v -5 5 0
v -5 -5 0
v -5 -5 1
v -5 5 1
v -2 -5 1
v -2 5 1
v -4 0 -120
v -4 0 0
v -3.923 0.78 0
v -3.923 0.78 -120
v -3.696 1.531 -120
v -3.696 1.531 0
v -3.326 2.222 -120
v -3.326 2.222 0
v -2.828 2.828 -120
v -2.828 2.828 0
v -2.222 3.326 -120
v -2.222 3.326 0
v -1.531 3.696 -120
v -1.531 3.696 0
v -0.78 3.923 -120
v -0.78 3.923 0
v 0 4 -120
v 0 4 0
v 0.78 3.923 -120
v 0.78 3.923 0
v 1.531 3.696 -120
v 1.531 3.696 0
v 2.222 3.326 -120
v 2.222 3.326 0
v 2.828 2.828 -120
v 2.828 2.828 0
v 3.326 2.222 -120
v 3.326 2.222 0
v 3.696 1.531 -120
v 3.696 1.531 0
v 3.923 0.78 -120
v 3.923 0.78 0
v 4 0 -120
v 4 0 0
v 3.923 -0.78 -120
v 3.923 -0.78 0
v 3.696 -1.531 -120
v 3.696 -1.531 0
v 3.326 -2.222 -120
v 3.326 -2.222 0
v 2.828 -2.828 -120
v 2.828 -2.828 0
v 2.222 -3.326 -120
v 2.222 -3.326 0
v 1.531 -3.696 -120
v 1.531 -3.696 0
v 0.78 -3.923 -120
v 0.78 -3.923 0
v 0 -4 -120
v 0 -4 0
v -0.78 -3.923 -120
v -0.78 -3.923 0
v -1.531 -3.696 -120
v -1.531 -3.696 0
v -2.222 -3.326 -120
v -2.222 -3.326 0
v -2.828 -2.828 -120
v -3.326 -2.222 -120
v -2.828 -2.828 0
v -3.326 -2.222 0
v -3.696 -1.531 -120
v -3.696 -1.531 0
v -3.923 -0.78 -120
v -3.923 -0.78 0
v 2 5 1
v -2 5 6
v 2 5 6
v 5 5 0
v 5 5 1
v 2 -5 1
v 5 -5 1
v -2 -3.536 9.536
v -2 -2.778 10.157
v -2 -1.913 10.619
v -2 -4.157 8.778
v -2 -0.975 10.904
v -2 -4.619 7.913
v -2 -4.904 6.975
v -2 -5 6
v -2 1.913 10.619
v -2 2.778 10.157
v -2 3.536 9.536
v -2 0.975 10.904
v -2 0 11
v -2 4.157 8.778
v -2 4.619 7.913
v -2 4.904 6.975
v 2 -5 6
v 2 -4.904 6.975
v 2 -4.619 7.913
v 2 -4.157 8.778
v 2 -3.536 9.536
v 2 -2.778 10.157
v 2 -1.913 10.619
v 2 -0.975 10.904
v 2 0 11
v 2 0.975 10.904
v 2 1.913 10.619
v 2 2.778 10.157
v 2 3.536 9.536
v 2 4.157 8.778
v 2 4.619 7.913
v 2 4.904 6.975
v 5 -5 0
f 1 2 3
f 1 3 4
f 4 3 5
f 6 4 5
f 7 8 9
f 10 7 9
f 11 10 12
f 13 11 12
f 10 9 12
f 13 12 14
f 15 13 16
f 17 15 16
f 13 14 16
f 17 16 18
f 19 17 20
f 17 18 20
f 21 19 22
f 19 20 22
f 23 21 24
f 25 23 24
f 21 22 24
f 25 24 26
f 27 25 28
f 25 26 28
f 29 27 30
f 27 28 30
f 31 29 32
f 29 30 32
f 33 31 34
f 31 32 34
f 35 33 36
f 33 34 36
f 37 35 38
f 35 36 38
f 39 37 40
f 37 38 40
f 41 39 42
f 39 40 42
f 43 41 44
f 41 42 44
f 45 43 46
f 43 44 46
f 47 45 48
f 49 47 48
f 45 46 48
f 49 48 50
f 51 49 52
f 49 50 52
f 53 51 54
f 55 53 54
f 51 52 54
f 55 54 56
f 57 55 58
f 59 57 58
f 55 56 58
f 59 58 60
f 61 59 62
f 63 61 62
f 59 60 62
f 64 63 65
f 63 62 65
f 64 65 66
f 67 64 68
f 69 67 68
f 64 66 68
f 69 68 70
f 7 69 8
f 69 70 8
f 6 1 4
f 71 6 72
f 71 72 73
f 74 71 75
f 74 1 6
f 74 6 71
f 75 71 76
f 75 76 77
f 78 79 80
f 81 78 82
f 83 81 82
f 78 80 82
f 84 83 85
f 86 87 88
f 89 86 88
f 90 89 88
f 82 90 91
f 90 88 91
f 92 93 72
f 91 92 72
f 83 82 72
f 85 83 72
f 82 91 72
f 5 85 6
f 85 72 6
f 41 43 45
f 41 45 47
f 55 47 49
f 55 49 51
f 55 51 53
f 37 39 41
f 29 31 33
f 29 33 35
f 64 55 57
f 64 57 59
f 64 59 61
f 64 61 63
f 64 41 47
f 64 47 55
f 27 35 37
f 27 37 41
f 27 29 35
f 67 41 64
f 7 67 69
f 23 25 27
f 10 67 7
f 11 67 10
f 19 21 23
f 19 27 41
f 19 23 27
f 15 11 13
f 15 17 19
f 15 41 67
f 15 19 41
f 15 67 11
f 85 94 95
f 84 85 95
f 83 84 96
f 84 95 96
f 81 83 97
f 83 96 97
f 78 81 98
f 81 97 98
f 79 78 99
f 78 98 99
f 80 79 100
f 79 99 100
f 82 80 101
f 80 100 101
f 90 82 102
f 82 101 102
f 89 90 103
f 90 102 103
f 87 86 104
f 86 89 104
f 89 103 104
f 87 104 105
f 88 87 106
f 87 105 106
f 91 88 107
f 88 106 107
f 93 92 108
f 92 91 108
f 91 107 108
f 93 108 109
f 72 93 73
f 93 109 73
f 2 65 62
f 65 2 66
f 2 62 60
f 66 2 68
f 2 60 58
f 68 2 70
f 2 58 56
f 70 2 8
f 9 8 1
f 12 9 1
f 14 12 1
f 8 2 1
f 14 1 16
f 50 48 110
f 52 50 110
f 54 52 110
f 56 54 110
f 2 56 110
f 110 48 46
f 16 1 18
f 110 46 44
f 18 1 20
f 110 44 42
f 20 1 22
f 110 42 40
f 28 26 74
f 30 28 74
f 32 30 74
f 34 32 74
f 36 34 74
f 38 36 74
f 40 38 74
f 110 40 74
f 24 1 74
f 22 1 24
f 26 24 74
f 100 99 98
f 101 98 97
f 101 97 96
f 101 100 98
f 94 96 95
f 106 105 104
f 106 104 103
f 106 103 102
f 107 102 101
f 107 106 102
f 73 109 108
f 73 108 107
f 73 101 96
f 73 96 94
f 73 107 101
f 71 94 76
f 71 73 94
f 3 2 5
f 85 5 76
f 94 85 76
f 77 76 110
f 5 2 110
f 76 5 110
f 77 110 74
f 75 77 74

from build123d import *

# Parameters (mm, degrees)
SKETCH_1_W          = 10
SKETCH_1_H          = 10
EXTRUDE_1_DEPTH     = 11
SKETCH_2_W          = 3
SKETCH_2_H          = 10
CUT_EXTRUDE_1_DEPTH = 11
SKETCH_3_R          = 4
EXTRUDE_2_DEPTH     = 120
CUT_EXTRUDE_2_DEPTH = 80


with BuildPart() as part:
    # 草图1 → 凸台-拉伸1 (new body)
    with BuildSketch(Plane.XY):
        Rectangle(SKETCH_1_W, SKETCH_1_H)
    extrude(amount=EXTRUDE_1_DEPTH)

    # 草图2 → 切除-拉伸1 (cut)
    with BuildSketch(Plane(origin=(0, 5, 0), x_dir=(1, 0, 0), z_dir=(0, 1, 0))):
        with Locations((-3.5, -6)):
            Rectangle(SKETCH_2_W, SKETCH_2_H)
        with Locations((3.5, -6)):
            Rectangle(SKETCH_2_W, SKETCH_2_H)
    extrude(amount=-CUT_EXTRUDE_1_DEPTH, mode=Mode.SUBTRACT)

    # 草图3 → 凸台-拉伸2 (add)
    with BuildSketch(Plane(origin=(0, 0, 0), x_dir=(-1, 0, 0), z_dir=(0, 0, -1))):
        Circle(SKETCH_3_R)
    extrude(amount=EXTRUDE_2_DEPTH)

    # 草图4 → 切除-拉伸2 (cut)
    with BuildSketch(Plane(origin=(2, 0, 0), x_dir=(0, 0, -1), z_dir=(1, 0, 0))):
        with BuildLine():
            Line((-6, 5), (-12.295699944, 5))
            Line((-12.295699944, 5), (-12.295699944, -5))
            Line((-12.295699944, -5), (-6, -5))
            ThreePointArc((-6, -5), (-11, 0), (-6, 5))
        make_face()
    extrude(amount=-CUT_EXTRUDE_2_DEPTH, mode=Mode.SUBTRACT)


solid = part.part
